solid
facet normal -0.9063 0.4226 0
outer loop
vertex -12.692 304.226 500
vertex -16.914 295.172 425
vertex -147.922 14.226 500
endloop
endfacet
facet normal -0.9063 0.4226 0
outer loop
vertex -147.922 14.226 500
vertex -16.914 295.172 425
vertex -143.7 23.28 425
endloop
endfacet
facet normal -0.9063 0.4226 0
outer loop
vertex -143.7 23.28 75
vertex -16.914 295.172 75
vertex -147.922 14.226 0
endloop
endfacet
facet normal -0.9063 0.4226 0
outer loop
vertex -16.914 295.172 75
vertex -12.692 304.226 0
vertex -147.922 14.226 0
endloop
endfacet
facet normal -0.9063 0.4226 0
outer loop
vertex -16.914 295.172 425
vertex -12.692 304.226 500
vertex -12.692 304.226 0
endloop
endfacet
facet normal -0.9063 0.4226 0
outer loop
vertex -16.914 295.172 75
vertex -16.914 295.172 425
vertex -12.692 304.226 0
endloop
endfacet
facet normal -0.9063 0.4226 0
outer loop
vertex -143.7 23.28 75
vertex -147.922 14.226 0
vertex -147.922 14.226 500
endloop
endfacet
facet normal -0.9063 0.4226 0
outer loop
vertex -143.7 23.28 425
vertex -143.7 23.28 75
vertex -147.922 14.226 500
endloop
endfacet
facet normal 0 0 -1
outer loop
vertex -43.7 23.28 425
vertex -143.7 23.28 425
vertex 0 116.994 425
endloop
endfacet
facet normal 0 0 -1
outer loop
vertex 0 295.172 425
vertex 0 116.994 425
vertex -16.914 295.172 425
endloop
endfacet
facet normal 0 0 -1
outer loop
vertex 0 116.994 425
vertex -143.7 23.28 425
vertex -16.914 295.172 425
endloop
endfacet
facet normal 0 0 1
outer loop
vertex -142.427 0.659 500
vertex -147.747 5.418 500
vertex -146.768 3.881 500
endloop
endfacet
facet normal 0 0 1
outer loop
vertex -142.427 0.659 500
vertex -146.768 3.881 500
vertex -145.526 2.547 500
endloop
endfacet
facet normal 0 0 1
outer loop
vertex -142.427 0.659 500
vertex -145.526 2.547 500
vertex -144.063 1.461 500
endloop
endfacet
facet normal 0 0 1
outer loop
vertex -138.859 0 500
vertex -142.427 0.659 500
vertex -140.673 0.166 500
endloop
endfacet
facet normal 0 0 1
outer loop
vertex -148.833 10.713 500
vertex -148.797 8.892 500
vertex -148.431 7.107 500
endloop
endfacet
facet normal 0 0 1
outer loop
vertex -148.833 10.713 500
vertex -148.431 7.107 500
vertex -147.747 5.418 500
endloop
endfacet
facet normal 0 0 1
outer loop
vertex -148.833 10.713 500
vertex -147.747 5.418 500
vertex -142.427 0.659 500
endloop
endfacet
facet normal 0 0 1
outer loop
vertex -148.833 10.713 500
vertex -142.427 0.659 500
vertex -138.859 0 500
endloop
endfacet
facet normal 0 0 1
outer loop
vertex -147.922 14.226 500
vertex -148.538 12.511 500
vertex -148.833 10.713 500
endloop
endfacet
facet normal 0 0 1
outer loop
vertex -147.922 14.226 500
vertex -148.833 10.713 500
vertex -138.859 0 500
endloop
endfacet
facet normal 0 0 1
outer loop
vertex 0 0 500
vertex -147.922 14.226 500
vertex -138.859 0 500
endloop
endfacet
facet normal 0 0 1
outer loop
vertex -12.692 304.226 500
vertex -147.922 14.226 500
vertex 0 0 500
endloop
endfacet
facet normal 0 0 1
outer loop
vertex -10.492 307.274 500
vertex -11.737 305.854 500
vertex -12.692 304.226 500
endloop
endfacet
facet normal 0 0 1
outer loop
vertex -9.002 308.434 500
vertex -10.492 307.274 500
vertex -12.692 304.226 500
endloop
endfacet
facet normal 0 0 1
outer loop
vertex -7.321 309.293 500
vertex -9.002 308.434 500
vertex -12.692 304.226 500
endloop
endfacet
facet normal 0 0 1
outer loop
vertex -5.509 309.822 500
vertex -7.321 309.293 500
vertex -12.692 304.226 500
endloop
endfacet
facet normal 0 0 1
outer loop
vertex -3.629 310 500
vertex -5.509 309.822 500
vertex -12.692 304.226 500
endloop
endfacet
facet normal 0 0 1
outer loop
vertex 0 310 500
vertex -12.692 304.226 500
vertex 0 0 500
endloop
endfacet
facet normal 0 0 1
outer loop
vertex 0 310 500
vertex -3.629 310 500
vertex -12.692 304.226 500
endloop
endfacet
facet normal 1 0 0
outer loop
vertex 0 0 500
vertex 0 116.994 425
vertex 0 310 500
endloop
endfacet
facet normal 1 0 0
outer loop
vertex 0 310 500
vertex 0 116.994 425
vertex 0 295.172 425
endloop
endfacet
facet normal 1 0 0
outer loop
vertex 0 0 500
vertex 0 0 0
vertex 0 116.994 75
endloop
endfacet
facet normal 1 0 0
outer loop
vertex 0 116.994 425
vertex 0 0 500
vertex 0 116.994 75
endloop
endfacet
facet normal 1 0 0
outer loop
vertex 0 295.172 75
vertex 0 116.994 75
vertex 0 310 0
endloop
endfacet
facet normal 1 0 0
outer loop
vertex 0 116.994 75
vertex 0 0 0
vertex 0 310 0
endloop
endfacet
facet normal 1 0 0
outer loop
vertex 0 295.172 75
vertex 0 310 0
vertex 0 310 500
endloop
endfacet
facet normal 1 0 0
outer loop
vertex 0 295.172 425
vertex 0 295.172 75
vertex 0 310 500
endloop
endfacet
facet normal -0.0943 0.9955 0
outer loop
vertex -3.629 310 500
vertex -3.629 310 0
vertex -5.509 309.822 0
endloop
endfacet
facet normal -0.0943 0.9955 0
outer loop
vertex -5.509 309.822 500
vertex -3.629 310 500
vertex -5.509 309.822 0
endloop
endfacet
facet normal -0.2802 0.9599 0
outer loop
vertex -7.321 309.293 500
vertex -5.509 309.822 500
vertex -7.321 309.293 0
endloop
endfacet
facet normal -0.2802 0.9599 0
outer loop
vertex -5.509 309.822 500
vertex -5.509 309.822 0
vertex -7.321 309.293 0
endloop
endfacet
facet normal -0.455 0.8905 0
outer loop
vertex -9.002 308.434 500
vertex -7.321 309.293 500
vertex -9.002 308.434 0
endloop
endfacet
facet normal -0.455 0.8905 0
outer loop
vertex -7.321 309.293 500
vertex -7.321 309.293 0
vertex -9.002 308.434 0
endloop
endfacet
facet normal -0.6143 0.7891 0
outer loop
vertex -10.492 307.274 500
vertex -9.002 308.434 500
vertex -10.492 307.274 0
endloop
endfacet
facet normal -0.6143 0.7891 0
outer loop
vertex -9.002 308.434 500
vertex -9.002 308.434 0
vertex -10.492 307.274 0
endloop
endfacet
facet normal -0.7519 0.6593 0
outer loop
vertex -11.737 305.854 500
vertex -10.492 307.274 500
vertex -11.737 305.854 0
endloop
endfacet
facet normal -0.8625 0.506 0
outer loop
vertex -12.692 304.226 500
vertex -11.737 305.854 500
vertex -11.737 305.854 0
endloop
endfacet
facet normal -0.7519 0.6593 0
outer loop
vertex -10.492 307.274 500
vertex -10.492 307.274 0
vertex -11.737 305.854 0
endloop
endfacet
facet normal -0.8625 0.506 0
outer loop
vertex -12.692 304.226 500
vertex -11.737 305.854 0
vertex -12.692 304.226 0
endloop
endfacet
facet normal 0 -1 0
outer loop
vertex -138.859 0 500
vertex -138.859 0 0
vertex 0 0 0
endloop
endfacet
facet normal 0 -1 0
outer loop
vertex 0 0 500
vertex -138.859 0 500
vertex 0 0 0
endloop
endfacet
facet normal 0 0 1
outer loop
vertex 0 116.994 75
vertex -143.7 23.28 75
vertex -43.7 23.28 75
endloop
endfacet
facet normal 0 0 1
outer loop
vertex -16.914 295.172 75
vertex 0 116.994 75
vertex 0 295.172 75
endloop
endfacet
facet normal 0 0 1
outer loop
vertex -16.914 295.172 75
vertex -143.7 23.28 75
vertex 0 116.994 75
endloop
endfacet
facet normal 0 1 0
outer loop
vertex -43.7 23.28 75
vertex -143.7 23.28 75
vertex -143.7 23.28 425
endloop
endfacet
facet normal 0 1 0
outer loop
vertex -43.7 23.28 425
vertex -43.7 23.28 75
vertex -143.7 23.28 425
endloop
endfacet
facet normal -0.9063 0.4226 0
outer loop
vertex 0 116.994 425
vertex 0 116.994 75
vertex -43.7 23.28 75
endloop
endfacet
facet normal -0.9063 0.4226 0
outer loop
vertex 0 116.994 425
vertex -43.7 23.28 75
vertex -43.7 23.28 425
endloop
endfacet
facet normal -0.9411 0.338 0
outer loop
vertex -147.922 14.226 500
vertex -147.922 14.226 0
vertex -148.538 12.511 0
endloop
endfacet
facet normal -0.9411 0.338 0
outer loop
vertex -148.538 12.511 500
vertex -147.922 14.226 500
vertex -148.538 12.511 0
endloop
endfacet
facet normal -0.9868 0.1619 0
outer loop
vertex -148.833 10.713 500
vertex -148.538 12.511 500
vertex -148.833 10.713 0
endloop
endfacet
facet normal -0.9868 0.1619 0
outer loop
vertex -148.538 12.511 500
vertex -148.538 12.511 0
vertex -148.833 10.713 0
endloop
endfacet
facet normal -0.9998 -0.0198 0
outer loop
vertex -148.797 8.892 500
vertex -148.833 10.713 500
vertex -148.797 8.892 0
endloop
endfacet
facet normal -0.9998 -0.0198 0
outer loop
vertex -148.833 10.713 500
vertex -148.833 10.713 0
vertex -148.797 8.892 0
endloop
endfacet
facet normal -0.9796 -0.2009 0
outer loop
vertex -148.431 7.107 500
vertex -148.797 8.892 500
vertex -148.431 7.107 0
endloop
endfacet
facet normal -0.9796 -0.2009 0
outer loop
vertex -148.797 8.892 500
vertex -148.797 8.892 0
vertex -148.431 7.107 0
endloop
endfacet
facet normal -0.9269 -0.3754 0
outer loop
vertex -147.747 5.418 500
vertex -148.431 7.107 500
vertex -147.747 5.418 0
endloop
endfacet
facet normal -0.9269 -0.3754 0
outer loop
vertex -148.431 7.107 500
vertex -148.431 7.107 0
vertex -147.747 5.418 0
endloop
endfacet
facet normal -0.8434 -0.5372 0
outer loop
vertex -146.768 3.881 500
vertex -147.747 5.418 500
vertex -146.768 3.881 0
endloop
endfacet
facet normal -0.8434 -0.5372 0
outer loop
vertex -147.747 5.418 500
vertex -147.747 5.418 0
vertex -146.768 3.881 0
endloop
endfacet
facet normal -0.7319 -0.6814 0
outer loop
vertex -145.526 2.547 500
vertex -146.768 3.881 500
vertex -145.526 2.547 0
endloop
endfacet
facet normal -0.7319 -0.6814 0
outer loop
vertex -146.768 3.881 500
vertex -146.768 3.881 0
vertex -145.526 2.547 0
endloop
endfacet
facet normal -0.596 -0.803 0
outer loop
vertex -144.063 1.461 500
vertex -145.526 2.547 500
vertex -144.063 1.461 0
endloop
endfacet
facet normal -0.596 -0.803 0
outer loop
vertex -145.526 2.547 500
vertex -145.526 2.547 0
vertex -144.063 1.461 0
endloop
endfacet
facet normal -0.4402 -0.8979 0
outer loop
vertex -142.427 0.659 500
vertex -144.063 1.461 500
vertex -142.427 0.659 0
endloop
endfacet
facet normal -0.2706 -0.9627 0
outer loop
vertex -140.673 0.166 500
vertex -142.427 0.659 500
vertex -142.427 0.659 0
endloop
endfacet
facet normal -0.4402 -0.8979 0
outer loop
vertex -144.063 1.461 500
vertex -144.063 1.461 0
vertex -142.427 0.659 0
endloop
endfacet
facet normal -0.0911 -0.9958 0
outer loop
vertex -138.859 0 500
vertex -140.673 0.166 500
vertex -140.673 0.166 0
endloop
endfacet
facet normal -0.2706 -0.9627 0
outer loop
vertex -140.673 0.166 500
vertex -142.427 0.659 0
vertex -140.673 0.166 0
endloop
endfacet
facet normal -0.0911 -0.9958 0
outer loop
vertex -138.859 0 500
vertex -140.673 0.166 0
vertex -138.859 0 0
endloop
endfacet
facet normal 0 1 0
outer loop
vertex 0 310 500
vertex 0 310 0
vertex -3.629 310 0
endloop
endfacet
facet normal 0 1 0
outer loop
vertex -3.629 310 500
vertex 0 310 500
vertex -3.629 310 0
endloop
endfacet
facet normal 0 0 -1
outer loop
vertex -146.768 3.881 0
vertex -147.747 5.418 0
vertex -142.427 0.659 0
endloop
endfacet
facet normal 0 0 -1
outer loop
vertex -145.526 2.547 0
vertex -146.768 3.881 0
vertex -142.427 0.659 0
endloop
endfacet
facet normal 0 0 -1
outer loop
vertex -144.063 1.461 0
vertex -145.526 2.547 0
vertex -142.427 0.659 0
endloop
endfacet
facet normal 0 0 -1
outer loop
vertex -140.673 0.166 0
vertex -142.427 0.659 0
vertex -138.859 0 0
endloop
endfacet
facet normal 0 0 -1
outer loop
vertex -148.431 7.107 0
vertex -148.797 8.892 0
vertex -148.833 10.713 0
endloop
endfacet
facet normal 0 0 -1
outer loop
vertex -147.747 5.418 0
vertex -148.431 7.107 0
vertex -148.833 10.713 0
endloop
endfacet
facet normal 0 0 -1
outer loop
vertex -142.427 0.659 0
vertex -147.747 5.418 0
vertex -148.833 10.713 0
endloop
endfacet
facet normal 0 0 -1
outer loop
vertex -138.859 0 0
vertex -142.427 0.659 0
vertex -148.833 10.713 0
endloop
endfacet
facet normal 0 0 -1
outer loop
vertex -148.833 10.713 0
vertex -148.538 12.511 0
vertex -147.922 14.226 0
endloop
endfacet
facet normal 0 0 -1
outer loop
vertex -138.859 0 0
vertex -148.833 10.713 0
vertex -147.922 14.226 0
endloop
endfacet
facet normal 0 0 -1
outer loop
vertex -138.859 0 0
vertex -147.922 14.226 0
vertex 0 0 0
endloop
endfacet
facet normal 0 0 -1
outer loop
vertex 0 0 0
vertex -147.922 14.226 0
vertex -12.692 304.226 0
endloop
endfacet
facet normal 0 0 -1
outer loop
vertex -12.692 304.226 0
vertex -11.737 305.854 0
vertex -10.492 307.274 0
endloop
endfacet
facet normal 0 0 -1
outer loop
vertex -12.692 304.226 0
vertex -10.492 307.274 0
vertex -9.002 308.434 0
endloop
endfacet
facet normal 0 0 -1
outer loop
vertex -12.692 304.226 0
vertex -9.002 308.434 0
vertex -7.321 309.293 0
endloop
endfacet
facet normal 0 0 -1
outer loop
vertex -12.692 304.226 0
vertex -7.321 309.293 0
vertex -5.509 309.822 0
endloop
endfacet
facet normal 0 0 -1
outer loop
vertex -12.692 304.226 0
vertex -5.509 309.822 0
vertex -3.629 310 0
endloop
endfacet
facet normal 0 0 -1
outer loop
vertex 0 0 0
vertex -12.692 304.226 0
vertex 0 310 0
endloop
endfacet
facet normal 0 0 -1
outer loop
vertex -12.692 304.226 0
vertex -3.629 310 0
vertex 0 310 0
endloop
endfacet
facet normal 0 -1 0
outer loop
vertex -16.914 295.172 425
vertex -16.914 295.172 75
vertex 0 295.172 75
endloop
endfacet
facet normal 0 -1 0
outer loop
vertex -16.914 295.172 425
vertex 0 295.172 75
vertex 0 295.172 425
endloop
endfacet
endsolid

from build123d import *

# Parameters (mm, degrees)
BOSS_EXTRUDE1_DEPTH = 500
SKETCH2_W           = 350
SKETCH2_H           = 300
CUT_EXTRUDE1_DEPTH  = 100


with BuildPart() as part:
    # Sketch1 → Boss-Extrude1 (new body)
    with BuildSketch(Plane.XY):
        with BuildLine():
            Line((0, 0), (0, 310))
            Line((0, 310), (-3.629297392, 310))
            ThreePointArc((-3.629297392, 310), (-9.002293475, 308.433914458), (-12.692375262, 304.226182617))
            Line((-12.692375262, 304.226182617), (-147.921596127, 14.226182617))
            ThreePointArc((-147.921596127, 14.226182617), (-147.292432715, 4.627003917), (-138.858518257, 0))
            Line((-138.858518257, 0), (0, 0))
        make_face()
    extrude(amount=BOSS_EXTRUDE1_DEPTH)

    # Sketch2 → Cut-Extrude1 (cut, along a direction that is not the sketch's normal)
    with BuildSketch(Plane(origin=(-126.950826732, 59.198142714, 0), x_dir=(0, 0, 1), z_dir=(-0.906307787, 0.422618262, 0))):
        with Locations((250, 110.368730506)):
            Rectangle(SKETCH2_W, SKETCH2_H)
    extrude(amount=-CUT_EXTRUDE1_DEPTH, dir=(-1, 0, 0), mode=Mode.SUBTRACT)


solid = part.part
